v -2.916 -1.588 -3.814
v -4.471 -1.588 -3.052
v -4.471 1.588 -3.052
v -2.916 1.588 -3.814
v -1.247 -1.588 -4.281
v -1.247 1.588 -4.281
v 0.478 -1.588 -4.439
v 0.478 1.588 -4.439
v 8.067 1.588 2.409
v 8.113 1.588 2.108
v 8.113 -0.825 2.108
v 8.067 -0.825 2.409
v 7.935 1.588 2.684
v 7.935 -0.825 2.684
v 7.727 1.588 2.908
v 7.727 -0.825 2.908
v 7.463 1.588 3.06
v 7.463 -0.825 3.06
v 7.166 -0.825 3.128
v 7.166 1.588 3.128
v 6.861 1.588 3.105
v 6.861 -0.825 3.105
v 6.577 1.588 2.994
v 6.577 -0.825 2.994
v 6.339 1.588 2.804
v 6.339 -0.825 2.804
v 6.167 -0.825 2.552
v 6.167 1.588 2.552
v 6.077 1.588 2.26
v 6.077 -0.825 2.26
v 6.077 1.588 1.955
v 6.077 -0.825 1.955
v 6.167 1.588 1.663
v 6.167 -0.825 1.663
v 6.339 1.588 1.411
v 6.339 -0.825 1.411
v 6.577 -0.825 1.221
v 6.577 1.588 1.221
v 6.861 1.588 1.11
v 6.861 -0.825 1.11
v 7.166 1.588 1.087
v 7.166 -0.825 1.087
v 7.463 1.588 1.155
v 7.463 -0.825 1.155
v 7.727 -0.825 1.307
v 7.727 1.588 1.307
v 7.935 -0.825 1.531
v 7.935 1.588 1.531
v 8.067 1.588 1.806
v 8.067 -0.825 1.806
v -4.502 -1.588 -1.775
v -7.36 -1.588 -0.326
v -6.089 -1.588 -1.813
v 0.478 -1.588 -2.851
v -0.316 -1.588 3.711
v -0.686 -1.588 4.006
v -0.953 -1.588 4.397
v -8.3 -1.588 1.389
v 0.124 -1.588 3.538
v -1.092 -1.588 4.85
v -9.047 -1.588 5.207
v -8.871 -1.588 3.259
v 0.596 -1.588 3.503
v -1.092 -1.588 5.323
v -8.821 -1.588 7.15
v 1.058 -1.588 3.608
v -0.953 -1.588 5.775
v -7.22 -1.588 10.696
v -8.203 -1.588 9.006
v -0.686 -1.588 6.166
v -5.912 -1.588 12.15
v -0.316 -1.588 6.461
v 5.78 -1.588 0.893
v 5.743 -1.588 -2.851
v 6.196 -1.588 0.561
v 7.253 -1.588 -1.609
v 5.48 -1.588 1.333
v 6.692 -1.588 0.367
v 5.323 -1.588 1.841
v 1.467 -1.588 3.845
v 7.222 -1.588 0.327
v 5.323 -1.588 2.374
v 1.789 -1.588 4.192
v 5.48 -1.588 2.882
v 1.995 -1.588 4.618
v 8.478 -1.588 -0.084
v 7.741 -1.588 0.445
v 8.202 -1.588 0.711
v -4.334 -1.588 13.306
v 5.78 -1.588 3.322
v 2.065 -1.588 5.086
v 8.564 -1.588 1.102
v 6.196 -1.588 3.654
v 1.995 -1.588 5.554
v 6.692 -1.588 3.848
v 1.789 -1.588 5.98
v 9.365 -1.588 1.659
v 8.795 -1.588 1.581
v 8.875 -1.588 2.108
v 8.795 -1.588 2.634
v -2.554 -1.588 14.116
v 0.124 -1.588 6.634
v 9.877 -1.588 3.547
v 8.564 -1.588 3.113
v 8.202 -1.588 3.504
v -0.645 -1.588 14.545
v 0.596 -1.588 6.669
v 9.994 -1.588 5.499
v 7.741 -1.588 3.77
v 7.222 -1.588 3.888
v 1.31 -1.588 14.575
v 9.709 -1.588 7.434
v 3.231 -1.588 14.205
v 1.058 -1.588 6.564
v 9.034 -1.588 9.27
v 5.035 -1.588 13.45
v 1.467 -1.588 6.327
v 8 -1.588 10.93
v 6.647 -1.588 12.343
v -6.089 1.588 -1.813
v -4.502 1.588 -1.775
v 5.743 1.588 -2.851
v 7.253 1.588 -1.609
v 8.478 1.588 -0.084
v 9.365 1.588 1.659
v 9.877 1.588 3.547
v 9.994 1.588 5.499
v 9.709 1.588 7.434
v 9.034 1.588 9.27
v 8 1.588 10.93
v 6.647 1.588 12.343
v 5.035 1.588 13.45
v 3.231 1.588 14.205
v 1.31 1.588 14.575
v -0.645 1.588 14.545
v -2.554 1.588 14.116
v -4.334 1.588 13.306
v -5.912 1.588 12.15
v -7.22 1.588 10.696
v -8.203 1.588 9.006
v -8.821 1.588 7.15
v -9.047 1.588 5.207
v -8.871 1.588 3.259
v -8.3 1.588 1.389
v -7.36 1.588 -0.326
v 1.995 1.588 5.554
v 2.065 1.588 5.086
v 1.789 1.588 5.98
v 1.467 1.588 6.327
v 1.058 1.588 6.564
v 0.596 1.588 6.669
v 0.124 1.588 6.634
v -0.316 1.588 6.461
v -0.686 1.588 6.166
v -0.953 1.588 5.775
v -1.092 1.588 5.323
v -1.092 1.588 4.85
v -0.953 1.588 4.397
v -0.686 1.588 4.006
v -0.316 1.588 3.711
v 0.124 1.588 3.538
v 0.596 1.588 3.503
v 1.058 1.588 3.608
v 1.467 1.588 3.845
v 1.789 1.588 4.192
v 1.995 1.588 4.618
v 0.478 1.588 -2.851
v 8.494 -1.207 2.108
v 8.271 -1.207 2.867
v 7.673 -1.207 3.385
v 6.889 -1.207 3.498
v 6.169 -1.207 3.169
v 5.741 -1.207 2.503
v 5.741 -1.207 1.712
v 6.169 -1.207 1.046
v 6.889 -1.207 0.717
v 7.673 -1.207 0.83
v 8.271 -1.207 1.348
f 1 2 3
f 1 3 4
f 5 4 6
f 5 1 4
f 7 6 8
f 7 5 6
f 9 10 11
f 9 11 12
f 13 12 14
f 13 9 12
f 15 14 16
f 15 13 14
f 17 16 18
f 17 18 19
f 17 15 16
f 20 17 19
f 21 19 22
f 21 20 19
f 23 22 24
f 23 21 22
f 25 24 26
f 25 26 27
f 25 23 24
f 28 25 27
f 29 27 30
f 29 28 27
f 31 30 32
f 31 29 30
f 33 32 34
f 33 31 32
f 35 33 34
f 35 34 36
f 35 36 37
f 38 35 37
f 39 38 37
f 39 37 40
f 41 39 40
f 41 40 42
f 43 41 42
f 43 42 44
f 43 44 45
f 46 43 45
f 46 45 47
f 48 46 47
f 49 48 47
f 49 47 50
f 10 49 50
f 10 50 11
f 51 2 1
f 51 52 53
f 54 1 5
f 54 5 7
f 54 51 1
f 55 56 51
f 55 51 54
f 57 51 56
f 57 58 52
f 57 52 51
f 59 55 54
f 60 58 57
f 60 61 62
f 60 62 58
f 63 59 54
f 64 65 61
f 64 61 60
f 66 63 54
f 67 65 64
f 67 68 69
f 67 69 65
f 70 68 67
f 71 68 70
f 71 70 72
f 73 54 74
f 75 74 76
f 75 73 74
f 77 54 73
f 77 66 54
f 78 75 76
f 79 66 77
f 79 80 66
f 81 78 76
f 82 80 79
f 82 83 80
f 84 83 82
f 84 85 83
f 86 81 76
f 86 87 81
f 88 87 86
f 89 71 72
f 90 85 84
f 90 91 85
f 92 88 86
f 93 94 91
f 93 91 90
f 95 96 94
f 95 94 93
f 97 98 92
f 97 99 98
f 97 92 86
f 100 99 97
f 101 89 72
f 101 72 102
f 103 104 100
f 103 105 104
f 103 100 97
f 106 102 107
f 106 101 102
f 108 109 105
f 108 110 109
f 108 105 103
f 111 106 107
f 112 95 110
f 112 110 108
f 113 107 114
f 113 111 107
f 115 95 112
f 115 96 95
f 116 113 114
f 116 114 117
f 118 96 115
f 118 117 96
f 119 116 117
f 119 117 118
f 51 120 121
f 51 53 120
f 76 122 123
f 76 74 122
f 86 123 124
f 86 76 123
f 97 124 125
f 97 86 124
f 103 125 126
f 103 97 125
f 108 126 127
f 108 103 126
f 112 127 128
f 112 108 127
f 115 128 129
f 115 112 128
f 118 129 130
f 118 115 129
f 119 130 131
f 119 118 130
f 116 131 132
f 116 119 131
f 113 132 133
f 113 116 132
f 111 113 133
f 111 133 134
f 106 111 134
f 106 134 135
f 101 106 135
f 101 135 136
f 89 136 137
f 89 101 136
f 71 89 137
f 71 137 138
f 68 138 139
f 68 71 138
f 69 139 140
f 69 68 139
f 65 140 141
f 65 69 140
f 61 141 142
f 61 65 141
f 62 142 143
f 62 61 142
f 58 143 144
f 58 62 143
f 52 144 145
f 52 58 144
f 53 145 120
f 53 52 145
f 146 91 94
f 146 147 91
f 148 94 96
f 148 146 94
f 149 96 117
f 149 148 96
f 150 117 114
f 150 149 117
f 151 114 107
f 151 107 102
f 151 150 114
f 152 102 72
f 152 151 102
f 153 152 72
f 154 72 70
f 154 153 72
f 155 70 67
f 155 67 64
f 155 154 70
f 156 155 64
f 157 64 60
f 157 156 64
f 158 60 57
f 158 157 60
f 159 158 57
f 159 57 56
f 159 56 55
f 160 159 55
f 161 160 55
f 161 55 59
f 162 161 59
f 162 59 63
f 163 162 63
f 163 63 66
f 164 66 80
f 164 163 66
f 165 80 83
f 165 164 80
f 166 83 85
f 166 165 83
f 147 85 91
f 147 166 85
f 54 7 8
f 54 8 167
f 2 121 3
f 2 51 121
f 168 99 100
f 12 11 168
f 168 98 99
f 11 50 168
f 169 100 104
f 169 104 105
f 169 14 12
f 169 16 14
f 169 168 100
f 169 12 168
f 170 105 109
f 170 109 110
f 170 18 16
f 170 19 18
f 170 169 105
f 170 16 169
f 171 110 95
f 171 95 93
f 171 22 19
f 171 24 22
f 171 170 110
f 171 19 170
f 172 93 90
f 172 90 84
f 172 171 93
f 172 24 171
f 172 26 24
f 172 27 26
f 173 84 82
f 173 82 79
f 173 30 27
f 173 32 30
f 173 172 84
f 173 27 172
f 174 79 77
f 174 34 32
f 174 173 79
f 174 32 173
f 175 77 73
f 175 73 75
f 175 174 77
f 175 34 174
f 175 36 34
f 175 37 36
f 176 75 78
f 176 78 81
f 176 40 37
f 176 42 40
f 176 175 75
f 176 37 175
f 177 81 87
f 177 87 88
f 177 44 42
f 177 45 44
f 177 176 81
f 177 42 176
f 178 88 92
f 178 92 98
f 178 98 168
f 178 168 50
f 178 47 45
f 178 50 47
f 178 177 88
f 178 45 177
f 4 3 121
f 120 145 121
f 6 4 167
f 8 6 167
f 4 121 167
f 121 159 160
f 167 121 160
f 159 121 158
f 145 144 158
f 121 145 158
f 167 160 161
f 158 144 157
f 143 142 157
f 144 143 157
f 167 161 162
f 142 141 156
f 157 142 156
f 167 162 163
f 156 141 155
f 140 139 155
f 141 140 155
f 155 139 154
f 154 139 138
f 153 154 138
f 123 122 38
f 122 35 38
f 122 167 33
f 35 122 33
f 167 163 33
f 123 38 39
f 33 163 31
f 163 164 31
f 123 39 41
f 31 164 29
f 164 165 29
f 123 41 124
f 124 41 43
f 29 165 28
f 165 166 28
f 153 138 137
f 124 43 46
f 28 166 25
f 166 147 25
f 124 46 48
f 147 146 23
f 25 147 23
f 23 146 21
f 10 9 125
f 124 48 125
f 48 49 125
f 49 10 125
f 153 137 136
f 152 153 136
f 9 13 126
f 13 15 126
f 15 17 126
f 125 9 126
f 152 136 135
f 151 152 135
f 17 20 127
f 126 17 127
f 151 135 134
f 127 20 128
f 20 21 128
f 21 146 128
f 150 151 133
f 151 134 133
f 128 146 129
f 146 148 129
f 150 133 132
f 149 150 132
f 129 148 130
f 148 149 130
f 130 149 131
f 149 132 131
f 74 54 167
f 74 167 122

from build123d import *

# Parameters (mm, degrees)
F0_R     = 1.02362
F0_R_2   = 1.5875
F1_DEPTH = 1.5875
F2_SIZE2 = 0.762
F2_SIZE  = 0.762


with BuildPart() as f1:
    # F0 (on Front) → F1 (new body, symmetric)
    with BuildSketch(Plane.XZ):
        with BuildLine():
            Line((-4.501804, -1.775407), (-4.471419, -3.052185))
            ThreePointArc((-4.471419, -3.052185), (-2.092182, -4.085642), (0.47765, -4.438859))
            Line((0.47765, -4.438859), (0.47765, -2.851359))
            Line((0.47765, -2.851359), (5.742792, -2.851359))
            ThreePointArc((5.742792, -2.851359), (1.310194, 14.574686), (-6.089304, -1.813188))
            Line((-6.089304, -1.813188), (-4.501804, -1.775407))
        make_face()
        with Locations((7.089037, 2.107543)):
            Circle(F0_R, mode=Mode.SUBTRACT)
        with Locations((0.47765, 5.086141)):
            Circle(F0_R_2, mode=Mode.SUBTRACT)
    extrude(amount=F1_DEPTH, both=True)

    # F2
    f2_edges = [f1.edges().sort_by_distance(p)[0] for p in [
        (6.065417, -1.5875, 2.107543),
    ]]
    chamfer(f2_edges, length=F2_SIZE, length2=F2_SIZE2)


solid = f1.part
